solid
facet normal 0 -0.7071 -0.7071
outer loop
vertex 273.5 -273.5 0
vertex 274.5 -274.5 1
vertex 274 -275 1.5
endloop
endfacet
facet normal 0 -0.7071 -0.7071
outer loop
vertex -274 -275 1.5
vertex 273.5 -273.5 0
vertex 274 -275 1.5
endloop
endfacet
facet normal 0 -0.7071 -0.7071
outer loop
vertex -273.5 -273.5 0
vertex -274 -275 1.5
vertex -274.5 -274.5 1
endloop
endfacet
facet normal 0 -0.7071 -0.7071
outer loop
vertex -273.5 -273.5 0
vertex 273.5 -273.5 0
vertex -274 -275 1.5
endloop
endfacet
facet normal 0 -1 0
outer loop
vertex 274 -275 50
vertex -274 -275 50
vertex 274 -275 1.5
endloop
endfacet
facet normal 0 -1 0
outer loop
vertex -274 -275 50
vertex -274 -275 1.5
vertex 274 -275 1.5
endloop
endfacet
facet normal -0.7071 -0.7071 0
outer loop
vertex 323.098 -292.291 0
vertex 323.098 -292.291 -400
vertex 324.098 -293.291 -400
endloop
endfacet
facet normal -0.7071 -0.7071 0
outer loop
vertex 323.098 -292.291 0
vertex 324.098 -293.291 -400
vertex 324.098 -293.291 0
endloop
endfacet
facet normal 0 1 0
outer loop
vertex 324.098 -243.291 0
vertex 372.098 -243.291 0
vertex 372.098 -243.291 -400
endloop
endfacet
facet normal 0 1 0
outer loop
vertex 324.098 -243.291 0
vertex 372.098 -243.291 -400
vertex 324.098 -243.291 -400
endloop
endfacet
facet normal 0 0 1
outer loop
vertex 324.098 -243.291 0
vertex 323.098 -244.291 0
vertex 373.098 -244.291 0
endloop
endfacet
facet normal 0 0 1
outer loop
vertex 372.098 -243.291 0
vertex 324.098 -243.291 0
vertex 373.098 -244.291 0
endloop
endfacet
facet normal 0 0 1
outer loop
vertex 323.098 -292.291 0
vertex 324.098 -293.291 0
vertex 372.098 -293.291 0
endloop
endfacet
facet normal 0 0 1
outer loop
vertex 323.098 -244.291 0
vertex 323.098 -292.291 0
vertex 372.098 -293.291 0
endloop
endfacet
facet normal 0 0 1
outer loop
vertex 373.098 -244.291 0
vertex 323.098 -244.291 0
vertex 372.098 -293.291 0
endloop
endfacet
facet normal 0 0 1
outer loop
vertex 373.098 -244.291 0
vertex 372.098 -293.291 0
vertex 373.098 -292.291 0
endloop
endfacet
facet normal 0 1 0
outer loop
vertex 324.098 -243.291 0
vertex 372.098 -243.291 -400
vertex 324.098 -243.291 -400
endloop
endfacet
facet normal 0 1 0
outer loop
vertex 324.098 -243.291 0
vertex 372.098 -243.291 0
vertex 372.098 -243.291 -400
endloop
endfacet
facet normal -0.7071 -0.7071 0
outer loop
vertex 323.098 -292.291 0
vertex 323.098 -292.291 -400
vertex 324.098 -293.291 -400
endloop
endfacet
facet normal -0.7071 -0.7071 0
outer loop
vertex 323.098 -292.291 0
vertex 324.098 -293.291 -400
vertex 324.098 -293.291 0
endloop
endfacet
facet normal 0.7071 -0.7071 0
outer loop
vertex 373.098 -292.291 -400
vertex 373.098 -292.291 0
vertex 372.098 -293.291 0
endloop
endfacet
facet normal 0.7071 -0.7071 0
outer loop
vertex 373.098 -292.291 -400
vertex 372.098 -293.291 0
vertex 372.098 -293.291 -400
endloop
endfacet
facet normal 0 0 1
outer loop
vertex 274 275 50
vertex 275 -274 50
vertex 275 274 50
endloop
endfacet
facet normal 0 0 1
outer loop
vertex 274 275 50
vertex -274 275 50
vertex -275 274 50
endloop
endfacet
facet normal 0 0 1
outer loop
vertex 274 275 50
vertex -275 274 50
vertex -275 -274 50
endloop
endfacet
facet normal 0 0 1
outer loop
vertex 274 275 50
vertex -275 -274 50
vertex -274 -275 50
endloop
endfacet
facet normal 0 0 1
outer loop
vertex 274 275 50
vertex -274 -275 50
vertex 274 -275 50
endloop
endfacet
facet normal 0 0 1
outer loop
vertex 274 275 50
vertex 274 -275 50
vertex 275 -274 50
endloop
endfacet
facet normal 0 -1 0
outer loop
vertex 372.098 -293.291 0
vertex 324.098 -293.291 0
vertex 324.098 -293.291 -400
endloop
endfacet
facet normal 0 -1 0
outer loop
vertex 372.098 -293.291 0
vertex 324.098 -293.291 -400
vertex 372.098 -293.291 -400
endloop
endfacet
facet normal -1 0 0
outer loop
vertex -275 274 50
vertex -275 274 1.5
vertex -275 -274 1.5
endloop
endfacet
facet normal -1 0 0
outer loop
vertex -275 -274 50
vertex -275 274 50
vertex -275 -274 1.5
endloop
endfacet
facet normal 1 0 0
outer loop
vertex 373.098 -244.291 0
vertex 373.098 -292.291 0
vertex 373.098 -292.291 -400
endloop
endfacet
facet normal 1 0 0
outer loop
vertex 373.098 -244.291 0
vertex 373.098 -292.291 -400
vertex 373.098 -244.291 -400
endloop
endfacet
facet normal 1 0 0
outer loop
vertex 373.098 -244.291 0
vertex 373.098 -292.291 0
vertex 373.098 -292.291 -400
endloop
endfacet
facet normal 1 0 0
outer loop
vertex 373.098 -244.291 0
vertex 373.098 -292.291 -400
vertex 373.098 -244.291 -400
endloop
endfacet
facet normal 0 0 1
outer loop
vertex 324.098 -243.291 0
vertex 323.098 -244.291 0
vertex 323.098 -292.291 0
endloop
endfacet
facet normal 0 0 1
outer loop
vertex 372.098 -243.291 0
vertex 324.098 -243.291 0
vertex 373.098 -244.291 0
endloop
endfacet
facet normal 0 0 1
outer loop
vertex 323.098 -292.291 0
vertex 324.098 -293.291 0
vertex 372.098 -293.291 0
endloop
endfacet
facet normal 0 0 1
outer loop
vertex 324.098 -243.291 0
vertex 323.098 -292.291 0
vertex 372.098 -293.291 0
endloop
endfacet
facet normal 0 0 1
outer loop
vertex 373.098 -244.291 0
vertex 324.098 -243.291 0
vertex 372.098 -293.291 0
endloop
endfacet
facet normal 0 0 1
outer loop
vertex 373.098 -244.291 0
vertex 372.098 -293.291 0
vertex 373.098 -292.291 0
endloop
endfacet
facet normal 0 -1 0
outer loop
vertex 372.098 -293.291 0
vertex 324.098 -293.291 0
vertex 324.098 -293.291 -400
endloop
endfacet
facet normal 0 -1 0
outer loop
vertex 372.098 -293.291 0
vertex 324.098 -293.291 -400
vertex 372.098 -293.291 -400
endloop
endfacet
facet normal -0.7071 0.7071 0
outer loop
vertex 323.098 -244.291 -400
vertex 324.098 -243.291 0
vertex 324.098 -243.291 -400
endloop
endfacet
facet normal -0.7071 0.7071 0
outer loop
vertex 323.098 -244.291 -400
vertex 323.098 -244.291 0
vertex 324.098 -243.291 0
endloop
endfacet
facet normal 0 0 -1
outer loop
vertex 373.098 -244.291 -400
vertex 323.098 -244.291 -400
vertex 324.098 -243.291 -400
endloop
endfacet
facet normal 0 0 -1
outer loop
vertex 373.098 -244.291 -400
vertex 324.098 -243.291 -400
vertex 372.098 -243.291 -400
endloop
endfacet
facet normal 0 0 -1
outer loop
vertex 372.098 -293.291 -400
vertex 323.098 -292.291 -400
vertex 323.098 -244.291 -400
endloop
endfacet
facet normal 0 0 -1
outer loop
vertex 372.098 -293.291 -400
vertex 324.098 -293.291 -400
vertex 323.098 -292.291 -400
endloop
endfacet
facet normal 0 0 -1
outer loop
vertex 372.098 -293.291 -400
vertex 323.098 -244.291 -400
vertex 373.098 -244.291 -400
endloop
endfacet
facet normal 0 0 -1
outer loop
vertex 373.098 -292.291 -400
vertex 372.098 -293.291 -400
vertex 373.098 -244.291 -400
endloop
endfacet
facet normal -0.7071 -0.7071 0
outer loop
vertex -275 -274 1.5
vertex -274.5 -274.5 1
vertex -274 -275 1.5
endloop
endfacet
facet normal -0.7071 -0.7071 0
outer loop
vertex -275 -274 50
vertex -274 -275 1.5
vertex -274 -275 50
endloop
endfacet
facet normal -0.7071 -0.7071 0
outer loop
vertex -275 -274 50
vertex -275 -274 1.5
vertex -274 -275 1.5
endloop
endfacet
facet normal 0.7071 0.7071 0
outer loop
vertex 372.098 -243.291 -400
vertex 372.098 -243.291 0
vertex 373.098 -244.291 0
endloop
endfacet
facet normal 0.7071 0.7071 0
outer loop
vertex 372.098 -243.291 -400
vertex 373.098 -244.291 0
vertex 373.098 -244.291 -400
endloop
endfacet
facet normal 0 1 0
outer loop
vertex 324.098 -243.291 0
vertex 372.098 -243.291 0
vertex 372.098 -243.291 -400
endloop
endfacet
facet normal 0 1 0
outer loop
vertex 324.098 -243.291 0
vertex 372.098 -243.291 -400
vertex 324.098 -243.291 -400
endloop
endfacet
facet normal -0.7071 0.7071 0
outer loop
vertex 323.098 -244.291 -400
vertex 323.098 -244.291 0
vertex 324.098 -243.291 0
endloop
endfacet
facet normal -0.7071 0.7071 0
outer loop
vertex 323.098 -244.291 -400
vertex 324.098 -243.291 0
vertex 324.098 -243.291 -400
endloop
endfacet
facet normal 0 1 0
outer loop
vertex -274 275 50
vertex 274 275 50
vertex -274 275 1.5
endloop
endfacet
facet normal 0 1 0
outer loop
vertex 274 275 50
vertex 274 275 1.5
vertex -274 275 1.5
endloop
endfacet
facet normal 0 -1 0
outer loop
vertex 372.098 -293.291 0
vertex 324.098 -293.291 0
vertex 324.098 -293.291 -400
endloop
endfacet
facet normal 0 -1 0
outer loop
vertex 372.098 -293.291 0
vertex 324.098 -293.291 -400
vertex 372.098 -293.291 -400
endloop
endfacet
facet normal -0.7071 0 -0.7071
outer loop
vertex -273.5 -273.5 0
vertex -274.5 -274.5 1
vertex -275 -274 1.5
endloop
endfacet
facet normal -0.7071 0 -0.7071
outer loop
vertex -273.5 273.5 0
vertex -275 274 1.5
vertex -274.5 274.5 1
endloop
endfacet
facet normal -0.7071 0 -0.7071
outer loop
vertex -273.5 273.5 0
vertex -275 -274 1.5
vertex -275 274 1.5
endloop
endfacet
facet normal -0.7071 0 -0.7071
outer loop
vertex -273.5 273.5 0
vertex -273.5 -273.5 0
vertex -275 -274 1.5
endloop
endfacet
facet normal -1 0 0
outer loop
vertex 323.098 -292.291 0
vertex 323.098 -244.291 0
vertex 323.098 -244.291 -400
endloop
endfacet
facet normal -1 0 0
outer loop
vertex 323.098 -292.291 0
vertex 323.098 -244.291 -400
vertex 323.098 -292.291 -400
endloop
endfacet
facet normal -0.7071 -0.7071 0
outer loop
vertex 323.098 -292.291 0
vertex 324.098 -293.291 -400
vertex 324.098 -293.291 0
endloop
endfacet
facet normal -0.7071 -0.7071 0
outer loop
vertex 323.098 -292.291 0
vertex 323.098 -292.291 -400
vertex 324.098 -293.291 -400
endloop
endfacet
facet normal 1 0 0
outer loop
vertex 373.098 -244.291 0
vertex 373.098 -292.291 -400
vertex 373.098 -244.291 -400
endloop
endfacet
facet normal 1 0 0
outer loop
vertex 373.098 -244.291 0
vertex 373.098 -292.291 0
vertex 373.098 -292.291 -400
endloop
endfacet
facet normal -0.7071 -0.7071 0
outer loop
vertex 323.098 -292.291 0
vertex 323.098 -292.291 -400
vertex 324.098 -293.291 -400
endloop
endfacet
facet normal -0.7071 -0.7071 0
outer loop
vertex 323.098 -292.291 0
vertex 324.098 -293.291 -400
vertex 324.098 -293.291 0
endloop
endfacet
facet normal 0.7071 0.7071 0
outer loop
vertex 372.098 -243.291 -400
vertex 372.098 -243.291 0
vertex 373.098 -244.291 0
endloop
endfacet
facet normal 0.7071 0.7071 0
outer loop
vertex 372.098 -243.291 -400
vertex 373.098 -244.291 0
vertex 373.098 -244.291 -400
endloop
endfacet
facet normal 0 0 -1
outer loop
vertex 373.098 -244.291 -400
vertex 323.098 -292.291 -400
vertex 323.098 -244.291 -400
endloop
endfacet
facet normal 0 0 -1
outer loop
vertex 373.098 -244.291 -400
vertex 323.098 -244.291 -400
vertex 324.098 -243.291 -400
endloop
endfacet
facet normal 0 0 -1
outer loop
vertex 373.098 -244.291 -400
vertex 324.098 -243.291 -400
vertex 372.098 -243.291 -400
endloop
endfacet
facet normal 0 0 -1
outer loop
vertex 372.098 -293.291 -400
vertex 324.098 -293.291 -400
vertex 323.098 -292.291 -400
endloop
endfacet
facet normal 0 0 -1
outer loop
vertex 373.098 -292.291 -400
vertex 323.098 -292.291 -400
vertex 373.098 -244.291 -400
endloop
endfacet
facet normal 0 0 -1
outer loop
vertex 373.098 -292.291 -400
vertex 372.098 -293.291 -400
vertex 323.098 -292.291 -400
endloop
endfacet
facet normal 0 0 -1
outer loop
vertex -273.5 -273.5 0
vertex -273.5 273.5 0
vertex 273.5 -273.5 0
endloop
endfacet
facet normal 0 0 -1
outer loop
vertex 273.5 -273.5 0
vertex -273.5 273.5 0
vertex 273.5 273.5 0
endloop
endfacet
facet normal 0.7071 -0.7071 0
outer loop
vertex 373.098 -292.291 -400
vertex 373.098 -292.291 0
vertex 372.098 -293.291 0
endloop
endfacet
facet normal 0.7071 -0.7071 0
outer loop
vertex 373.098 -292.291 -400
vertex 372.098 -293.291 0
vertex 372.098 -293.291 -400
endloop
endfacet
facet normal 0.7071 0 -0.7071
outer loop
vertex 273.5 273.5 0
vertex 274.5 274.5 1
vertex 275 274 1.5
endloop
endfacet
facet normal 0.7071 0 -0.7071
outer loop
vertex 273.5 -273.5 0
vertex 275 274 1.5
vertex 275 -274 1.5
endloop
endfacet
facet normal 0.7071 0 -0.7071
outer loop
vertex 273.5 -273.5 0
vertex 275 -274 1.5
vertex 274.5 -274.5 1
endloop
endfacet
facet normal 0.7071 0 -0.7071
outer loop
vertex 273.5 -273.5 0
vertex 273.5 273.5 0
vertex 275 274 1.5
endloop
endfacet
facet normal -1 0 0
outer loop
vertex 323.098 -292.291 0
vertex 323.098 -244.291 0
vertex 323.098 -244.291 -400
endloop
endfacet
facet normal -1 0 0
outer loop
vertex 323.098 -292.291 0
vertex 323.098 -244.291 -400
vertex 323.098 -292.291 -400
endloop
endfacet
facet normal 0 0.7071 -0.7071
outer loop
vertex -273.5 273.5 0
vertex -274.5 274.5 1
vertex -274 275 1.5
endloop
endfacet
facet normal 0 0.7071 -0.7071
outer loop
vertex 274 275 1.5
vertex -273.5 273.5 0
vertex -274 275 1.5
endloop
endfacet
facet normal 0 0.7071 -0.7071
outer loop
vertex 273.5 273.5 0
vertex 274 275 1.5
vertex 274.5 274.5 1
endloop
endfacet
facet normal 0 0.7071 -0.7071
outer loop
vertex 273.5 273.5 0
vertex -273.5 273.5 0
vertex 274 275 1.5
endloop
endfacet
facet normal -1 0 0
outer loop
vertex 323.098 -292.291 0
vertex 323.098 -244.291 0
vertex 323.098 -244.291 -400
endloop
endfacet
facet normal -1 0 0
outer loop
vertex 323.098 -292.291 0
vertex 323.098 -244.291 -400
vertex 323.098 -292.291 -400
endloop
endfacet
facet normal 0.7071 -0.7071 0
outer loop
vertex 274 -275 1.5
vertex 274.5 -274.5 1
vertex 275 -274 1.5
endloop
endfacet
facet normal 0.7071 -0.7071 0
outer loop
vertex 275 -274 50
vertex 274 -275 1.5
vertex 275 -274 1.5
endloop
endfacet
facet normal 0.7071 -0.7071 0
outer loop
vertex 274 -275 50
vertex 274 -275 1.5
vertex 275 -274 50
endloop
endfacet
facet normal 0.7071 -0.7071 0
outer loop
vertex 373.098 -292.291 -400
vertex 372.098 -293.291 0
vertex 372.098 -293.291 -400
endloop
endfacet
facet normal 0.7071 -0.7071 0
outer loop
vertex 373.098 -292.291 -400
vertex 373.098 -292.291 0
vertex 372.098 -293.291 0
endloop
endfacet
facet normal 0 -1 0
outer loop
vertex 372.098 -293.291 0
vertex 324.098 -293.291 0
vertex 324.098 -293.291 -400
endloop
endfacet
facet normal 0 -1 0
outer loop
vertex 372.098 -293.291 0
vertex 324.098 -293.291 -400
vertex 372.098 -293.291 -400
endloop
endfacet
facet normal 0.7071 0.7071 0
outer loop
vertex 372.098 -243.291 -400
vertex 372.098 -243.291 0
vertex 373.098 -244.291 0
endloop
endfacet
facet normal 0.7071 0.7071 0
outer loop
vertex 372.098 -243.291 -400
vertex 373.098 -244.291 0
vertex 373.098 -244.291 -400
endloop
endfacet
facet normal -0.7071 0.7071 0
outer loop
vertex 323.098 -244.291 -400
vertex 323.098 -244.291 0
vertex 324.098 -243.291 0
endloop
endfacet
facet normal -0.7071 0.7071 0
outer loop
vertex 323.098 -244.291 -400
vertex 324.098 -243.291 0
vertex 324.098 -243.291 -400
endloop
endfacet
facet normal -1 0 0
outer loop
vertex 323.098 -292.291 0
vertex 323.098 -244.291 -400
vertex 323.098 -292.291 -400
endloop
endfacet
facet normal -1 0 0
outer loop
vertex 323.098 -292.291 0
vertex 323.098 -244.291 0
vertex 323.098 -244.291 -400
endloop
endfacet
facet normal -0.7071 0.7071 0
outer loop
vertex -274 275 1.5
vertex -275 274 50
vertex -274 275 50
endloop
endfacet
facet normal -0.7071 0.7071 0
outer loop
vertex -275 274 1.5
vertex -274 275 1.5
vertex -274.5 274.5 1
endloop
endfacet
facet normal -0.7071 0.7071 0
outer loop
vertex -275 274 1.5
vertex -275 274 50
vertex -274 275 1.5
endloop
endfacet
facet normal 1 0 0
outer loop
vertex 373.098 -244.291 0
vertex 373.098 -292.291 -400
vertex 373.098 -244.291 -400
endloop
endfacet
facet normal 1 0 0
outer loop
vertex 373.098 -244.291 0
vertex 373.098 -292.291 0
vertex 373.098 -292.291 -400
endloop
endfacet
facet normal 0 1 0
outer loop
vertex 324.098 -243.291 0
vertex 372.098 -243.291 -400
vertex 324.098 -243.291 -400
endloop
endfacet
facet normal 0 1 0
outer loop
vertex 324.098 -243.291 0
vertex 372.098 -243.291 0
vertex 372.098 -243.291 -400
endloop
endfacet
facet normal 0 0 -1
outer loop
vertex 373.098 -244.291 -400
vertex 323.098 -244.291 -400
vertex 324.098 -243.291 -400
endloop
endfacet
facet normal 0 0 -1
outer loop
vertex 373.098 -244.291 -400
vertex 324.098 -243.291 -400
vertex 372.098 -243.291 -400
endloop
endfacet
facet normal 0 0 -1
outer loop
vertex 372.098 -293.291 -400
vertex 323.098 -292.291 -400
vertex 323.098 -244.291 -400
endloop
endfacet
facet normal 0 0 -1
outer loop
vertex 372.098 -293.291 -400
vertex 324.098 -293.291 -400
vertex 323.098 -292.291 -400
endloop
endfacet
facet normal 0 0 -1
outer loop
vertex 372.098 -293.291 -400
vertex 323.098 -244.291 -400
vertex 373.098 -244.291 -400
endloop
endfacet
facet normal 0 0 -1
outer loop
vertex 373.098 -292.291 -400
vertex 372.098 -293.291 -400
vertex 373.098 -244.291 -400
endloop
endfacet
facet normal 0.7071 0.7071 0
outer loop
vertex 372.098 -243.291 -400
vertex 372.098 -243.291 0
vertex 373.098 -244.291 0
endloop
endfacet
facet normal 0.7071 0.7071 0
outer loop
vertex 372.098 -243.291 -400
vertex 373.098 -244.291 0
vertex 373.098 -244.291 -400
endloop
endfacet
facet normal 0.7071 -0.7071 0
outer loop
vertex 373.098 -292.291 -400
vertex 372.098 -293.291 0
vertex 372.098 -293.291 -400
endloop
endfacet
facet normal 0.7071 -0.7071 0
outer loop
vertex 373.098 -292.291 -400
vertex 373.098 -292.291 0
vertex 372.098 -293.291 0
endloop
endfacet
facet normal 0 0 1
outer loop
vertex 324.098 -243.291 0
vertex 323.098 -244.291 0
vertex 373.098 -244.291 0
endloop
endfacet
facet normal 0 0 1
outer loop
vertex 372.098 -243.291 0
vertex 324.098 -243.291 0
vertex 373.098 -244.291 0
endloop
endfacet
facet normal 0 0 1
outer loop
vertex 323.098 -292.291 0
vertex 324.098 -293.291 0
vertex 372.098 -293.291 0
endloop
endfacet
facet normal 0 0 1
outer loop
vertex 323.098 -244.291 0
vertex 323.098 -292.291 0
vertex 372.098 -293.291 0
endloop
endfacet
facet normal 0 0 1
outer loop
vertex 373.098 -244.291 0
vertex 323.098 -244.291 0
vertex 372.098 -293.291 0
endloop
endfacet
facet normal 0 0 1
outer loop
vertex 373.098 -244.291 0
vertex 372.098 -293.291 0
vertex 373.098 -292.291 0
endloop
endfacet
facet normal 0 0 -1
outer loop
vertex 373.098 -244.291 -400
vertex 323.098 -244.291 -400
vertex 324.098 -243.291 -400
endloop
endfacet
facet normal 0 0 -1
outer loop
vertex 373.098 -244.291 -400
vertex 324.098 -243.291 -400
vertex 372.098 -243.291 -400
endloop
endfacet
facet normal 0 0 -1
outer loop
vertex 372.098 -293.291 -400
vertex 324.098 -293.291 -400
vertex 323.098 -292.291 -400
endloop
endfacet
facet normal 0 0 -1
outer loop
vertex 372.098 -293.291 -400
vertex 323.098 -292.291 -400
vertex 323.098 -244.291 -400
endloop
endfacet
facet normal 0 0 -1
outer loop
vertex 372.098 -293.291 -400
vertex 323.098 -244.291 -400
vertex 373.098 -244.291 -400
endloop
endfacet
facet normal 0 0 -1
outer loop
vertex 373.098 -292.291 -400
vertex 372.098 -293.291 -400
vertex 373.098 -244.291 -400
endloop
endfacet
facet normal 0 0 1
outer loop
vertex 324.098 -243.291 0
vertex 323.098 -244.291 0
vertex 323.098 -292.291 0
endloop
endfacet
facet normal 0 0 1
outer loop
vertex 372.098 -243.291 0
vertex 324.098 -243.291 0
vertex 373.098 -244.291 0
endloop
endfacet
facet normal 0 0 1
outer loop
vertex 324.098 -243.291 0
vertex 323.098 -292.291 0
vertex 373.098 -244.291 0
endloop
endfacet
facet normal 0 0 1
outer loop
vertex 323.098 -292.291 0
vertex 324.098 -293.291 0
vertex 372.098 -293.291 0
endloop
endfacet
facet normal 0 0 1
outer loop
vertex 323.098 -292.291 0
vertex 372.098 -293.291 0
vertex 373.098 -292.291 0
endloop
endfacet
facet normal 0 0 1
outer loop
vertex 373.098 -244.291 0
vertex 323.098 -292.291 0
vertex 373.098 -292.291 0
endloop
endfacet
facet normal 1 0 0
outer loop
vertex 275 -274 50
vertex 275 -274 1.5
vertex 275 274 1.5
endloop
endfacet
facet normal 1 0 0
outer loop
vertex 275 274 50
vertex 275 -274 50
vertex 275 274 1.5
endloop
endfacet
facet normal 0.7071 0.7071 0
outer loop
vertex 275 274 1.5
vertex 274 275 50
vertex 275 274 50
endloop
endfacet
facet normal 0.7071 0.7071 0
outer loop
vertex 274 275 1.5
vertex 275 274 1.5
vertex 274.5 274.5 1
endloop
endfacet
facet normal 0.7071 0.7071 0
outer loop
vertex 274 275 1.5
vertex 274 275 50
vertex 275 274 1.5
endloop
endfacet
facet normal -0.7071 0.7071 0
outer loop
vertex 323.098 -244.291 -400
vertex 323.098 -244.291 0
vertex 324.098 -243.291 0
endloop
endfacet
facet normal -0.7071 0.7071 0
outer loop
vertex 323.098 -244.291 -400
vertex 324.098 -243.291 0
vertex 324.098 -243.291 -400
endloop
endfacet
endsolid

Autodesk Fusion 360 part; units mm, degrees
sketch "Sketch1" plane through (0, 0, 0) normal (0, 0, 1) x (1, 0, 0) in component "Top"
  line L0 (275, 275) -> (-275, 275)
  line L1 (-275, 275) -> (-275, -275)
  line L2 (-275, -275) -> (275, -275)
  line L3 (275, -275) -> (275, 275)
  line L4 (275, 275) -> (-275, -275) construction
  line L5 (-275, 275) -> (275, -275) construction
  dimension "d1" = 550
  dimension "d2" = 550
extrude "Extrude1" add sketch "Sketch1" along normal blind 50 makes body 1 in component "Top"
sketch "Sketch1 (2)" plane through (0, 0, 0) normal (0, 0, -1) x (1, 0, 0) in component "Leg"
  line L0 (275, -275) -> (275, 275)
  line L1 (275, 275) -> (-275, 275)
  line L2 (-275, 275) -> (-275, -275)
  line L3 (-275, -275) -> (275, -275)
  line L4 (323.0985, 293.2911) -> (373.0985, 293.2911)
  line L5 (373.0985, 293.2911) -> (373.0985, 243.2911)
  line L6 (373.0985, 243.2911) -> (323.0985, 243.2911)
  line L7 (323.0985, 243.2911) -> (323.0985, 293.2911)
  dimension "d5" = 50
  dimension "d6" = 50
extrude "Extrude1'" add sketch "Sketch1 (2)" along normal blind 400 separate body contours L4 L5 L6 L7 makes body 2 in component "Leg"
chamfer "Chamfer1" distance 1 angle 45 4 edges at (373.0985, -243.2911, -200) (323.0985, -243.2911, -200) (323.0985, -293.2911, -200) (373.0985, -293.2911, -200) on bodies 2 in component "Leg"
pattern_linear "持1" [suppressed] in component "Lega"
chamfer "Chamfer1'" distance 1.5 angle 45 4 edges at (0, 275, 0) (275, 0, 0) (0, -275, 0) (-275, 0, 0) on bodies 1 in component "Top"
chamfer "Chamfer2" distance 1 angle 45 4 edges at (-275, -275, 25.75) (-275, 275, 25.75) (275, 275, 25.75) (275, -275, 25.75) on bodies 1 in component "Top"
component "Top" placed x (1, 0, 0) y (0, 1, 0) z (0, 0, 1) at (0, 0, 0)
component "Lega" placed x (1, 0, 0) y (0, 1, 0) z (0, 0, 1) at (0, 0, 0)
component "Leg" placed x (1, 0, 0) y (0, 1, 0) z (0, 0, 1) at (0, 0, 0) in component "Lega"
component "Leg" placed x (1, 0, 0) y (0, 1, 0) z (0, 0, 1) at (0, 0, 0) in component "Lega"
component "Leg" placed x (1, 0, 0) y (0, 1, 0) z (0, 0, 1) at (0, 0, 0) in component "Lega"
component "Leg" placed x (1, 0, 0) y (0, 1, 0) z (0, 0, 1) at (0, 0, 0) in component "Lega"
